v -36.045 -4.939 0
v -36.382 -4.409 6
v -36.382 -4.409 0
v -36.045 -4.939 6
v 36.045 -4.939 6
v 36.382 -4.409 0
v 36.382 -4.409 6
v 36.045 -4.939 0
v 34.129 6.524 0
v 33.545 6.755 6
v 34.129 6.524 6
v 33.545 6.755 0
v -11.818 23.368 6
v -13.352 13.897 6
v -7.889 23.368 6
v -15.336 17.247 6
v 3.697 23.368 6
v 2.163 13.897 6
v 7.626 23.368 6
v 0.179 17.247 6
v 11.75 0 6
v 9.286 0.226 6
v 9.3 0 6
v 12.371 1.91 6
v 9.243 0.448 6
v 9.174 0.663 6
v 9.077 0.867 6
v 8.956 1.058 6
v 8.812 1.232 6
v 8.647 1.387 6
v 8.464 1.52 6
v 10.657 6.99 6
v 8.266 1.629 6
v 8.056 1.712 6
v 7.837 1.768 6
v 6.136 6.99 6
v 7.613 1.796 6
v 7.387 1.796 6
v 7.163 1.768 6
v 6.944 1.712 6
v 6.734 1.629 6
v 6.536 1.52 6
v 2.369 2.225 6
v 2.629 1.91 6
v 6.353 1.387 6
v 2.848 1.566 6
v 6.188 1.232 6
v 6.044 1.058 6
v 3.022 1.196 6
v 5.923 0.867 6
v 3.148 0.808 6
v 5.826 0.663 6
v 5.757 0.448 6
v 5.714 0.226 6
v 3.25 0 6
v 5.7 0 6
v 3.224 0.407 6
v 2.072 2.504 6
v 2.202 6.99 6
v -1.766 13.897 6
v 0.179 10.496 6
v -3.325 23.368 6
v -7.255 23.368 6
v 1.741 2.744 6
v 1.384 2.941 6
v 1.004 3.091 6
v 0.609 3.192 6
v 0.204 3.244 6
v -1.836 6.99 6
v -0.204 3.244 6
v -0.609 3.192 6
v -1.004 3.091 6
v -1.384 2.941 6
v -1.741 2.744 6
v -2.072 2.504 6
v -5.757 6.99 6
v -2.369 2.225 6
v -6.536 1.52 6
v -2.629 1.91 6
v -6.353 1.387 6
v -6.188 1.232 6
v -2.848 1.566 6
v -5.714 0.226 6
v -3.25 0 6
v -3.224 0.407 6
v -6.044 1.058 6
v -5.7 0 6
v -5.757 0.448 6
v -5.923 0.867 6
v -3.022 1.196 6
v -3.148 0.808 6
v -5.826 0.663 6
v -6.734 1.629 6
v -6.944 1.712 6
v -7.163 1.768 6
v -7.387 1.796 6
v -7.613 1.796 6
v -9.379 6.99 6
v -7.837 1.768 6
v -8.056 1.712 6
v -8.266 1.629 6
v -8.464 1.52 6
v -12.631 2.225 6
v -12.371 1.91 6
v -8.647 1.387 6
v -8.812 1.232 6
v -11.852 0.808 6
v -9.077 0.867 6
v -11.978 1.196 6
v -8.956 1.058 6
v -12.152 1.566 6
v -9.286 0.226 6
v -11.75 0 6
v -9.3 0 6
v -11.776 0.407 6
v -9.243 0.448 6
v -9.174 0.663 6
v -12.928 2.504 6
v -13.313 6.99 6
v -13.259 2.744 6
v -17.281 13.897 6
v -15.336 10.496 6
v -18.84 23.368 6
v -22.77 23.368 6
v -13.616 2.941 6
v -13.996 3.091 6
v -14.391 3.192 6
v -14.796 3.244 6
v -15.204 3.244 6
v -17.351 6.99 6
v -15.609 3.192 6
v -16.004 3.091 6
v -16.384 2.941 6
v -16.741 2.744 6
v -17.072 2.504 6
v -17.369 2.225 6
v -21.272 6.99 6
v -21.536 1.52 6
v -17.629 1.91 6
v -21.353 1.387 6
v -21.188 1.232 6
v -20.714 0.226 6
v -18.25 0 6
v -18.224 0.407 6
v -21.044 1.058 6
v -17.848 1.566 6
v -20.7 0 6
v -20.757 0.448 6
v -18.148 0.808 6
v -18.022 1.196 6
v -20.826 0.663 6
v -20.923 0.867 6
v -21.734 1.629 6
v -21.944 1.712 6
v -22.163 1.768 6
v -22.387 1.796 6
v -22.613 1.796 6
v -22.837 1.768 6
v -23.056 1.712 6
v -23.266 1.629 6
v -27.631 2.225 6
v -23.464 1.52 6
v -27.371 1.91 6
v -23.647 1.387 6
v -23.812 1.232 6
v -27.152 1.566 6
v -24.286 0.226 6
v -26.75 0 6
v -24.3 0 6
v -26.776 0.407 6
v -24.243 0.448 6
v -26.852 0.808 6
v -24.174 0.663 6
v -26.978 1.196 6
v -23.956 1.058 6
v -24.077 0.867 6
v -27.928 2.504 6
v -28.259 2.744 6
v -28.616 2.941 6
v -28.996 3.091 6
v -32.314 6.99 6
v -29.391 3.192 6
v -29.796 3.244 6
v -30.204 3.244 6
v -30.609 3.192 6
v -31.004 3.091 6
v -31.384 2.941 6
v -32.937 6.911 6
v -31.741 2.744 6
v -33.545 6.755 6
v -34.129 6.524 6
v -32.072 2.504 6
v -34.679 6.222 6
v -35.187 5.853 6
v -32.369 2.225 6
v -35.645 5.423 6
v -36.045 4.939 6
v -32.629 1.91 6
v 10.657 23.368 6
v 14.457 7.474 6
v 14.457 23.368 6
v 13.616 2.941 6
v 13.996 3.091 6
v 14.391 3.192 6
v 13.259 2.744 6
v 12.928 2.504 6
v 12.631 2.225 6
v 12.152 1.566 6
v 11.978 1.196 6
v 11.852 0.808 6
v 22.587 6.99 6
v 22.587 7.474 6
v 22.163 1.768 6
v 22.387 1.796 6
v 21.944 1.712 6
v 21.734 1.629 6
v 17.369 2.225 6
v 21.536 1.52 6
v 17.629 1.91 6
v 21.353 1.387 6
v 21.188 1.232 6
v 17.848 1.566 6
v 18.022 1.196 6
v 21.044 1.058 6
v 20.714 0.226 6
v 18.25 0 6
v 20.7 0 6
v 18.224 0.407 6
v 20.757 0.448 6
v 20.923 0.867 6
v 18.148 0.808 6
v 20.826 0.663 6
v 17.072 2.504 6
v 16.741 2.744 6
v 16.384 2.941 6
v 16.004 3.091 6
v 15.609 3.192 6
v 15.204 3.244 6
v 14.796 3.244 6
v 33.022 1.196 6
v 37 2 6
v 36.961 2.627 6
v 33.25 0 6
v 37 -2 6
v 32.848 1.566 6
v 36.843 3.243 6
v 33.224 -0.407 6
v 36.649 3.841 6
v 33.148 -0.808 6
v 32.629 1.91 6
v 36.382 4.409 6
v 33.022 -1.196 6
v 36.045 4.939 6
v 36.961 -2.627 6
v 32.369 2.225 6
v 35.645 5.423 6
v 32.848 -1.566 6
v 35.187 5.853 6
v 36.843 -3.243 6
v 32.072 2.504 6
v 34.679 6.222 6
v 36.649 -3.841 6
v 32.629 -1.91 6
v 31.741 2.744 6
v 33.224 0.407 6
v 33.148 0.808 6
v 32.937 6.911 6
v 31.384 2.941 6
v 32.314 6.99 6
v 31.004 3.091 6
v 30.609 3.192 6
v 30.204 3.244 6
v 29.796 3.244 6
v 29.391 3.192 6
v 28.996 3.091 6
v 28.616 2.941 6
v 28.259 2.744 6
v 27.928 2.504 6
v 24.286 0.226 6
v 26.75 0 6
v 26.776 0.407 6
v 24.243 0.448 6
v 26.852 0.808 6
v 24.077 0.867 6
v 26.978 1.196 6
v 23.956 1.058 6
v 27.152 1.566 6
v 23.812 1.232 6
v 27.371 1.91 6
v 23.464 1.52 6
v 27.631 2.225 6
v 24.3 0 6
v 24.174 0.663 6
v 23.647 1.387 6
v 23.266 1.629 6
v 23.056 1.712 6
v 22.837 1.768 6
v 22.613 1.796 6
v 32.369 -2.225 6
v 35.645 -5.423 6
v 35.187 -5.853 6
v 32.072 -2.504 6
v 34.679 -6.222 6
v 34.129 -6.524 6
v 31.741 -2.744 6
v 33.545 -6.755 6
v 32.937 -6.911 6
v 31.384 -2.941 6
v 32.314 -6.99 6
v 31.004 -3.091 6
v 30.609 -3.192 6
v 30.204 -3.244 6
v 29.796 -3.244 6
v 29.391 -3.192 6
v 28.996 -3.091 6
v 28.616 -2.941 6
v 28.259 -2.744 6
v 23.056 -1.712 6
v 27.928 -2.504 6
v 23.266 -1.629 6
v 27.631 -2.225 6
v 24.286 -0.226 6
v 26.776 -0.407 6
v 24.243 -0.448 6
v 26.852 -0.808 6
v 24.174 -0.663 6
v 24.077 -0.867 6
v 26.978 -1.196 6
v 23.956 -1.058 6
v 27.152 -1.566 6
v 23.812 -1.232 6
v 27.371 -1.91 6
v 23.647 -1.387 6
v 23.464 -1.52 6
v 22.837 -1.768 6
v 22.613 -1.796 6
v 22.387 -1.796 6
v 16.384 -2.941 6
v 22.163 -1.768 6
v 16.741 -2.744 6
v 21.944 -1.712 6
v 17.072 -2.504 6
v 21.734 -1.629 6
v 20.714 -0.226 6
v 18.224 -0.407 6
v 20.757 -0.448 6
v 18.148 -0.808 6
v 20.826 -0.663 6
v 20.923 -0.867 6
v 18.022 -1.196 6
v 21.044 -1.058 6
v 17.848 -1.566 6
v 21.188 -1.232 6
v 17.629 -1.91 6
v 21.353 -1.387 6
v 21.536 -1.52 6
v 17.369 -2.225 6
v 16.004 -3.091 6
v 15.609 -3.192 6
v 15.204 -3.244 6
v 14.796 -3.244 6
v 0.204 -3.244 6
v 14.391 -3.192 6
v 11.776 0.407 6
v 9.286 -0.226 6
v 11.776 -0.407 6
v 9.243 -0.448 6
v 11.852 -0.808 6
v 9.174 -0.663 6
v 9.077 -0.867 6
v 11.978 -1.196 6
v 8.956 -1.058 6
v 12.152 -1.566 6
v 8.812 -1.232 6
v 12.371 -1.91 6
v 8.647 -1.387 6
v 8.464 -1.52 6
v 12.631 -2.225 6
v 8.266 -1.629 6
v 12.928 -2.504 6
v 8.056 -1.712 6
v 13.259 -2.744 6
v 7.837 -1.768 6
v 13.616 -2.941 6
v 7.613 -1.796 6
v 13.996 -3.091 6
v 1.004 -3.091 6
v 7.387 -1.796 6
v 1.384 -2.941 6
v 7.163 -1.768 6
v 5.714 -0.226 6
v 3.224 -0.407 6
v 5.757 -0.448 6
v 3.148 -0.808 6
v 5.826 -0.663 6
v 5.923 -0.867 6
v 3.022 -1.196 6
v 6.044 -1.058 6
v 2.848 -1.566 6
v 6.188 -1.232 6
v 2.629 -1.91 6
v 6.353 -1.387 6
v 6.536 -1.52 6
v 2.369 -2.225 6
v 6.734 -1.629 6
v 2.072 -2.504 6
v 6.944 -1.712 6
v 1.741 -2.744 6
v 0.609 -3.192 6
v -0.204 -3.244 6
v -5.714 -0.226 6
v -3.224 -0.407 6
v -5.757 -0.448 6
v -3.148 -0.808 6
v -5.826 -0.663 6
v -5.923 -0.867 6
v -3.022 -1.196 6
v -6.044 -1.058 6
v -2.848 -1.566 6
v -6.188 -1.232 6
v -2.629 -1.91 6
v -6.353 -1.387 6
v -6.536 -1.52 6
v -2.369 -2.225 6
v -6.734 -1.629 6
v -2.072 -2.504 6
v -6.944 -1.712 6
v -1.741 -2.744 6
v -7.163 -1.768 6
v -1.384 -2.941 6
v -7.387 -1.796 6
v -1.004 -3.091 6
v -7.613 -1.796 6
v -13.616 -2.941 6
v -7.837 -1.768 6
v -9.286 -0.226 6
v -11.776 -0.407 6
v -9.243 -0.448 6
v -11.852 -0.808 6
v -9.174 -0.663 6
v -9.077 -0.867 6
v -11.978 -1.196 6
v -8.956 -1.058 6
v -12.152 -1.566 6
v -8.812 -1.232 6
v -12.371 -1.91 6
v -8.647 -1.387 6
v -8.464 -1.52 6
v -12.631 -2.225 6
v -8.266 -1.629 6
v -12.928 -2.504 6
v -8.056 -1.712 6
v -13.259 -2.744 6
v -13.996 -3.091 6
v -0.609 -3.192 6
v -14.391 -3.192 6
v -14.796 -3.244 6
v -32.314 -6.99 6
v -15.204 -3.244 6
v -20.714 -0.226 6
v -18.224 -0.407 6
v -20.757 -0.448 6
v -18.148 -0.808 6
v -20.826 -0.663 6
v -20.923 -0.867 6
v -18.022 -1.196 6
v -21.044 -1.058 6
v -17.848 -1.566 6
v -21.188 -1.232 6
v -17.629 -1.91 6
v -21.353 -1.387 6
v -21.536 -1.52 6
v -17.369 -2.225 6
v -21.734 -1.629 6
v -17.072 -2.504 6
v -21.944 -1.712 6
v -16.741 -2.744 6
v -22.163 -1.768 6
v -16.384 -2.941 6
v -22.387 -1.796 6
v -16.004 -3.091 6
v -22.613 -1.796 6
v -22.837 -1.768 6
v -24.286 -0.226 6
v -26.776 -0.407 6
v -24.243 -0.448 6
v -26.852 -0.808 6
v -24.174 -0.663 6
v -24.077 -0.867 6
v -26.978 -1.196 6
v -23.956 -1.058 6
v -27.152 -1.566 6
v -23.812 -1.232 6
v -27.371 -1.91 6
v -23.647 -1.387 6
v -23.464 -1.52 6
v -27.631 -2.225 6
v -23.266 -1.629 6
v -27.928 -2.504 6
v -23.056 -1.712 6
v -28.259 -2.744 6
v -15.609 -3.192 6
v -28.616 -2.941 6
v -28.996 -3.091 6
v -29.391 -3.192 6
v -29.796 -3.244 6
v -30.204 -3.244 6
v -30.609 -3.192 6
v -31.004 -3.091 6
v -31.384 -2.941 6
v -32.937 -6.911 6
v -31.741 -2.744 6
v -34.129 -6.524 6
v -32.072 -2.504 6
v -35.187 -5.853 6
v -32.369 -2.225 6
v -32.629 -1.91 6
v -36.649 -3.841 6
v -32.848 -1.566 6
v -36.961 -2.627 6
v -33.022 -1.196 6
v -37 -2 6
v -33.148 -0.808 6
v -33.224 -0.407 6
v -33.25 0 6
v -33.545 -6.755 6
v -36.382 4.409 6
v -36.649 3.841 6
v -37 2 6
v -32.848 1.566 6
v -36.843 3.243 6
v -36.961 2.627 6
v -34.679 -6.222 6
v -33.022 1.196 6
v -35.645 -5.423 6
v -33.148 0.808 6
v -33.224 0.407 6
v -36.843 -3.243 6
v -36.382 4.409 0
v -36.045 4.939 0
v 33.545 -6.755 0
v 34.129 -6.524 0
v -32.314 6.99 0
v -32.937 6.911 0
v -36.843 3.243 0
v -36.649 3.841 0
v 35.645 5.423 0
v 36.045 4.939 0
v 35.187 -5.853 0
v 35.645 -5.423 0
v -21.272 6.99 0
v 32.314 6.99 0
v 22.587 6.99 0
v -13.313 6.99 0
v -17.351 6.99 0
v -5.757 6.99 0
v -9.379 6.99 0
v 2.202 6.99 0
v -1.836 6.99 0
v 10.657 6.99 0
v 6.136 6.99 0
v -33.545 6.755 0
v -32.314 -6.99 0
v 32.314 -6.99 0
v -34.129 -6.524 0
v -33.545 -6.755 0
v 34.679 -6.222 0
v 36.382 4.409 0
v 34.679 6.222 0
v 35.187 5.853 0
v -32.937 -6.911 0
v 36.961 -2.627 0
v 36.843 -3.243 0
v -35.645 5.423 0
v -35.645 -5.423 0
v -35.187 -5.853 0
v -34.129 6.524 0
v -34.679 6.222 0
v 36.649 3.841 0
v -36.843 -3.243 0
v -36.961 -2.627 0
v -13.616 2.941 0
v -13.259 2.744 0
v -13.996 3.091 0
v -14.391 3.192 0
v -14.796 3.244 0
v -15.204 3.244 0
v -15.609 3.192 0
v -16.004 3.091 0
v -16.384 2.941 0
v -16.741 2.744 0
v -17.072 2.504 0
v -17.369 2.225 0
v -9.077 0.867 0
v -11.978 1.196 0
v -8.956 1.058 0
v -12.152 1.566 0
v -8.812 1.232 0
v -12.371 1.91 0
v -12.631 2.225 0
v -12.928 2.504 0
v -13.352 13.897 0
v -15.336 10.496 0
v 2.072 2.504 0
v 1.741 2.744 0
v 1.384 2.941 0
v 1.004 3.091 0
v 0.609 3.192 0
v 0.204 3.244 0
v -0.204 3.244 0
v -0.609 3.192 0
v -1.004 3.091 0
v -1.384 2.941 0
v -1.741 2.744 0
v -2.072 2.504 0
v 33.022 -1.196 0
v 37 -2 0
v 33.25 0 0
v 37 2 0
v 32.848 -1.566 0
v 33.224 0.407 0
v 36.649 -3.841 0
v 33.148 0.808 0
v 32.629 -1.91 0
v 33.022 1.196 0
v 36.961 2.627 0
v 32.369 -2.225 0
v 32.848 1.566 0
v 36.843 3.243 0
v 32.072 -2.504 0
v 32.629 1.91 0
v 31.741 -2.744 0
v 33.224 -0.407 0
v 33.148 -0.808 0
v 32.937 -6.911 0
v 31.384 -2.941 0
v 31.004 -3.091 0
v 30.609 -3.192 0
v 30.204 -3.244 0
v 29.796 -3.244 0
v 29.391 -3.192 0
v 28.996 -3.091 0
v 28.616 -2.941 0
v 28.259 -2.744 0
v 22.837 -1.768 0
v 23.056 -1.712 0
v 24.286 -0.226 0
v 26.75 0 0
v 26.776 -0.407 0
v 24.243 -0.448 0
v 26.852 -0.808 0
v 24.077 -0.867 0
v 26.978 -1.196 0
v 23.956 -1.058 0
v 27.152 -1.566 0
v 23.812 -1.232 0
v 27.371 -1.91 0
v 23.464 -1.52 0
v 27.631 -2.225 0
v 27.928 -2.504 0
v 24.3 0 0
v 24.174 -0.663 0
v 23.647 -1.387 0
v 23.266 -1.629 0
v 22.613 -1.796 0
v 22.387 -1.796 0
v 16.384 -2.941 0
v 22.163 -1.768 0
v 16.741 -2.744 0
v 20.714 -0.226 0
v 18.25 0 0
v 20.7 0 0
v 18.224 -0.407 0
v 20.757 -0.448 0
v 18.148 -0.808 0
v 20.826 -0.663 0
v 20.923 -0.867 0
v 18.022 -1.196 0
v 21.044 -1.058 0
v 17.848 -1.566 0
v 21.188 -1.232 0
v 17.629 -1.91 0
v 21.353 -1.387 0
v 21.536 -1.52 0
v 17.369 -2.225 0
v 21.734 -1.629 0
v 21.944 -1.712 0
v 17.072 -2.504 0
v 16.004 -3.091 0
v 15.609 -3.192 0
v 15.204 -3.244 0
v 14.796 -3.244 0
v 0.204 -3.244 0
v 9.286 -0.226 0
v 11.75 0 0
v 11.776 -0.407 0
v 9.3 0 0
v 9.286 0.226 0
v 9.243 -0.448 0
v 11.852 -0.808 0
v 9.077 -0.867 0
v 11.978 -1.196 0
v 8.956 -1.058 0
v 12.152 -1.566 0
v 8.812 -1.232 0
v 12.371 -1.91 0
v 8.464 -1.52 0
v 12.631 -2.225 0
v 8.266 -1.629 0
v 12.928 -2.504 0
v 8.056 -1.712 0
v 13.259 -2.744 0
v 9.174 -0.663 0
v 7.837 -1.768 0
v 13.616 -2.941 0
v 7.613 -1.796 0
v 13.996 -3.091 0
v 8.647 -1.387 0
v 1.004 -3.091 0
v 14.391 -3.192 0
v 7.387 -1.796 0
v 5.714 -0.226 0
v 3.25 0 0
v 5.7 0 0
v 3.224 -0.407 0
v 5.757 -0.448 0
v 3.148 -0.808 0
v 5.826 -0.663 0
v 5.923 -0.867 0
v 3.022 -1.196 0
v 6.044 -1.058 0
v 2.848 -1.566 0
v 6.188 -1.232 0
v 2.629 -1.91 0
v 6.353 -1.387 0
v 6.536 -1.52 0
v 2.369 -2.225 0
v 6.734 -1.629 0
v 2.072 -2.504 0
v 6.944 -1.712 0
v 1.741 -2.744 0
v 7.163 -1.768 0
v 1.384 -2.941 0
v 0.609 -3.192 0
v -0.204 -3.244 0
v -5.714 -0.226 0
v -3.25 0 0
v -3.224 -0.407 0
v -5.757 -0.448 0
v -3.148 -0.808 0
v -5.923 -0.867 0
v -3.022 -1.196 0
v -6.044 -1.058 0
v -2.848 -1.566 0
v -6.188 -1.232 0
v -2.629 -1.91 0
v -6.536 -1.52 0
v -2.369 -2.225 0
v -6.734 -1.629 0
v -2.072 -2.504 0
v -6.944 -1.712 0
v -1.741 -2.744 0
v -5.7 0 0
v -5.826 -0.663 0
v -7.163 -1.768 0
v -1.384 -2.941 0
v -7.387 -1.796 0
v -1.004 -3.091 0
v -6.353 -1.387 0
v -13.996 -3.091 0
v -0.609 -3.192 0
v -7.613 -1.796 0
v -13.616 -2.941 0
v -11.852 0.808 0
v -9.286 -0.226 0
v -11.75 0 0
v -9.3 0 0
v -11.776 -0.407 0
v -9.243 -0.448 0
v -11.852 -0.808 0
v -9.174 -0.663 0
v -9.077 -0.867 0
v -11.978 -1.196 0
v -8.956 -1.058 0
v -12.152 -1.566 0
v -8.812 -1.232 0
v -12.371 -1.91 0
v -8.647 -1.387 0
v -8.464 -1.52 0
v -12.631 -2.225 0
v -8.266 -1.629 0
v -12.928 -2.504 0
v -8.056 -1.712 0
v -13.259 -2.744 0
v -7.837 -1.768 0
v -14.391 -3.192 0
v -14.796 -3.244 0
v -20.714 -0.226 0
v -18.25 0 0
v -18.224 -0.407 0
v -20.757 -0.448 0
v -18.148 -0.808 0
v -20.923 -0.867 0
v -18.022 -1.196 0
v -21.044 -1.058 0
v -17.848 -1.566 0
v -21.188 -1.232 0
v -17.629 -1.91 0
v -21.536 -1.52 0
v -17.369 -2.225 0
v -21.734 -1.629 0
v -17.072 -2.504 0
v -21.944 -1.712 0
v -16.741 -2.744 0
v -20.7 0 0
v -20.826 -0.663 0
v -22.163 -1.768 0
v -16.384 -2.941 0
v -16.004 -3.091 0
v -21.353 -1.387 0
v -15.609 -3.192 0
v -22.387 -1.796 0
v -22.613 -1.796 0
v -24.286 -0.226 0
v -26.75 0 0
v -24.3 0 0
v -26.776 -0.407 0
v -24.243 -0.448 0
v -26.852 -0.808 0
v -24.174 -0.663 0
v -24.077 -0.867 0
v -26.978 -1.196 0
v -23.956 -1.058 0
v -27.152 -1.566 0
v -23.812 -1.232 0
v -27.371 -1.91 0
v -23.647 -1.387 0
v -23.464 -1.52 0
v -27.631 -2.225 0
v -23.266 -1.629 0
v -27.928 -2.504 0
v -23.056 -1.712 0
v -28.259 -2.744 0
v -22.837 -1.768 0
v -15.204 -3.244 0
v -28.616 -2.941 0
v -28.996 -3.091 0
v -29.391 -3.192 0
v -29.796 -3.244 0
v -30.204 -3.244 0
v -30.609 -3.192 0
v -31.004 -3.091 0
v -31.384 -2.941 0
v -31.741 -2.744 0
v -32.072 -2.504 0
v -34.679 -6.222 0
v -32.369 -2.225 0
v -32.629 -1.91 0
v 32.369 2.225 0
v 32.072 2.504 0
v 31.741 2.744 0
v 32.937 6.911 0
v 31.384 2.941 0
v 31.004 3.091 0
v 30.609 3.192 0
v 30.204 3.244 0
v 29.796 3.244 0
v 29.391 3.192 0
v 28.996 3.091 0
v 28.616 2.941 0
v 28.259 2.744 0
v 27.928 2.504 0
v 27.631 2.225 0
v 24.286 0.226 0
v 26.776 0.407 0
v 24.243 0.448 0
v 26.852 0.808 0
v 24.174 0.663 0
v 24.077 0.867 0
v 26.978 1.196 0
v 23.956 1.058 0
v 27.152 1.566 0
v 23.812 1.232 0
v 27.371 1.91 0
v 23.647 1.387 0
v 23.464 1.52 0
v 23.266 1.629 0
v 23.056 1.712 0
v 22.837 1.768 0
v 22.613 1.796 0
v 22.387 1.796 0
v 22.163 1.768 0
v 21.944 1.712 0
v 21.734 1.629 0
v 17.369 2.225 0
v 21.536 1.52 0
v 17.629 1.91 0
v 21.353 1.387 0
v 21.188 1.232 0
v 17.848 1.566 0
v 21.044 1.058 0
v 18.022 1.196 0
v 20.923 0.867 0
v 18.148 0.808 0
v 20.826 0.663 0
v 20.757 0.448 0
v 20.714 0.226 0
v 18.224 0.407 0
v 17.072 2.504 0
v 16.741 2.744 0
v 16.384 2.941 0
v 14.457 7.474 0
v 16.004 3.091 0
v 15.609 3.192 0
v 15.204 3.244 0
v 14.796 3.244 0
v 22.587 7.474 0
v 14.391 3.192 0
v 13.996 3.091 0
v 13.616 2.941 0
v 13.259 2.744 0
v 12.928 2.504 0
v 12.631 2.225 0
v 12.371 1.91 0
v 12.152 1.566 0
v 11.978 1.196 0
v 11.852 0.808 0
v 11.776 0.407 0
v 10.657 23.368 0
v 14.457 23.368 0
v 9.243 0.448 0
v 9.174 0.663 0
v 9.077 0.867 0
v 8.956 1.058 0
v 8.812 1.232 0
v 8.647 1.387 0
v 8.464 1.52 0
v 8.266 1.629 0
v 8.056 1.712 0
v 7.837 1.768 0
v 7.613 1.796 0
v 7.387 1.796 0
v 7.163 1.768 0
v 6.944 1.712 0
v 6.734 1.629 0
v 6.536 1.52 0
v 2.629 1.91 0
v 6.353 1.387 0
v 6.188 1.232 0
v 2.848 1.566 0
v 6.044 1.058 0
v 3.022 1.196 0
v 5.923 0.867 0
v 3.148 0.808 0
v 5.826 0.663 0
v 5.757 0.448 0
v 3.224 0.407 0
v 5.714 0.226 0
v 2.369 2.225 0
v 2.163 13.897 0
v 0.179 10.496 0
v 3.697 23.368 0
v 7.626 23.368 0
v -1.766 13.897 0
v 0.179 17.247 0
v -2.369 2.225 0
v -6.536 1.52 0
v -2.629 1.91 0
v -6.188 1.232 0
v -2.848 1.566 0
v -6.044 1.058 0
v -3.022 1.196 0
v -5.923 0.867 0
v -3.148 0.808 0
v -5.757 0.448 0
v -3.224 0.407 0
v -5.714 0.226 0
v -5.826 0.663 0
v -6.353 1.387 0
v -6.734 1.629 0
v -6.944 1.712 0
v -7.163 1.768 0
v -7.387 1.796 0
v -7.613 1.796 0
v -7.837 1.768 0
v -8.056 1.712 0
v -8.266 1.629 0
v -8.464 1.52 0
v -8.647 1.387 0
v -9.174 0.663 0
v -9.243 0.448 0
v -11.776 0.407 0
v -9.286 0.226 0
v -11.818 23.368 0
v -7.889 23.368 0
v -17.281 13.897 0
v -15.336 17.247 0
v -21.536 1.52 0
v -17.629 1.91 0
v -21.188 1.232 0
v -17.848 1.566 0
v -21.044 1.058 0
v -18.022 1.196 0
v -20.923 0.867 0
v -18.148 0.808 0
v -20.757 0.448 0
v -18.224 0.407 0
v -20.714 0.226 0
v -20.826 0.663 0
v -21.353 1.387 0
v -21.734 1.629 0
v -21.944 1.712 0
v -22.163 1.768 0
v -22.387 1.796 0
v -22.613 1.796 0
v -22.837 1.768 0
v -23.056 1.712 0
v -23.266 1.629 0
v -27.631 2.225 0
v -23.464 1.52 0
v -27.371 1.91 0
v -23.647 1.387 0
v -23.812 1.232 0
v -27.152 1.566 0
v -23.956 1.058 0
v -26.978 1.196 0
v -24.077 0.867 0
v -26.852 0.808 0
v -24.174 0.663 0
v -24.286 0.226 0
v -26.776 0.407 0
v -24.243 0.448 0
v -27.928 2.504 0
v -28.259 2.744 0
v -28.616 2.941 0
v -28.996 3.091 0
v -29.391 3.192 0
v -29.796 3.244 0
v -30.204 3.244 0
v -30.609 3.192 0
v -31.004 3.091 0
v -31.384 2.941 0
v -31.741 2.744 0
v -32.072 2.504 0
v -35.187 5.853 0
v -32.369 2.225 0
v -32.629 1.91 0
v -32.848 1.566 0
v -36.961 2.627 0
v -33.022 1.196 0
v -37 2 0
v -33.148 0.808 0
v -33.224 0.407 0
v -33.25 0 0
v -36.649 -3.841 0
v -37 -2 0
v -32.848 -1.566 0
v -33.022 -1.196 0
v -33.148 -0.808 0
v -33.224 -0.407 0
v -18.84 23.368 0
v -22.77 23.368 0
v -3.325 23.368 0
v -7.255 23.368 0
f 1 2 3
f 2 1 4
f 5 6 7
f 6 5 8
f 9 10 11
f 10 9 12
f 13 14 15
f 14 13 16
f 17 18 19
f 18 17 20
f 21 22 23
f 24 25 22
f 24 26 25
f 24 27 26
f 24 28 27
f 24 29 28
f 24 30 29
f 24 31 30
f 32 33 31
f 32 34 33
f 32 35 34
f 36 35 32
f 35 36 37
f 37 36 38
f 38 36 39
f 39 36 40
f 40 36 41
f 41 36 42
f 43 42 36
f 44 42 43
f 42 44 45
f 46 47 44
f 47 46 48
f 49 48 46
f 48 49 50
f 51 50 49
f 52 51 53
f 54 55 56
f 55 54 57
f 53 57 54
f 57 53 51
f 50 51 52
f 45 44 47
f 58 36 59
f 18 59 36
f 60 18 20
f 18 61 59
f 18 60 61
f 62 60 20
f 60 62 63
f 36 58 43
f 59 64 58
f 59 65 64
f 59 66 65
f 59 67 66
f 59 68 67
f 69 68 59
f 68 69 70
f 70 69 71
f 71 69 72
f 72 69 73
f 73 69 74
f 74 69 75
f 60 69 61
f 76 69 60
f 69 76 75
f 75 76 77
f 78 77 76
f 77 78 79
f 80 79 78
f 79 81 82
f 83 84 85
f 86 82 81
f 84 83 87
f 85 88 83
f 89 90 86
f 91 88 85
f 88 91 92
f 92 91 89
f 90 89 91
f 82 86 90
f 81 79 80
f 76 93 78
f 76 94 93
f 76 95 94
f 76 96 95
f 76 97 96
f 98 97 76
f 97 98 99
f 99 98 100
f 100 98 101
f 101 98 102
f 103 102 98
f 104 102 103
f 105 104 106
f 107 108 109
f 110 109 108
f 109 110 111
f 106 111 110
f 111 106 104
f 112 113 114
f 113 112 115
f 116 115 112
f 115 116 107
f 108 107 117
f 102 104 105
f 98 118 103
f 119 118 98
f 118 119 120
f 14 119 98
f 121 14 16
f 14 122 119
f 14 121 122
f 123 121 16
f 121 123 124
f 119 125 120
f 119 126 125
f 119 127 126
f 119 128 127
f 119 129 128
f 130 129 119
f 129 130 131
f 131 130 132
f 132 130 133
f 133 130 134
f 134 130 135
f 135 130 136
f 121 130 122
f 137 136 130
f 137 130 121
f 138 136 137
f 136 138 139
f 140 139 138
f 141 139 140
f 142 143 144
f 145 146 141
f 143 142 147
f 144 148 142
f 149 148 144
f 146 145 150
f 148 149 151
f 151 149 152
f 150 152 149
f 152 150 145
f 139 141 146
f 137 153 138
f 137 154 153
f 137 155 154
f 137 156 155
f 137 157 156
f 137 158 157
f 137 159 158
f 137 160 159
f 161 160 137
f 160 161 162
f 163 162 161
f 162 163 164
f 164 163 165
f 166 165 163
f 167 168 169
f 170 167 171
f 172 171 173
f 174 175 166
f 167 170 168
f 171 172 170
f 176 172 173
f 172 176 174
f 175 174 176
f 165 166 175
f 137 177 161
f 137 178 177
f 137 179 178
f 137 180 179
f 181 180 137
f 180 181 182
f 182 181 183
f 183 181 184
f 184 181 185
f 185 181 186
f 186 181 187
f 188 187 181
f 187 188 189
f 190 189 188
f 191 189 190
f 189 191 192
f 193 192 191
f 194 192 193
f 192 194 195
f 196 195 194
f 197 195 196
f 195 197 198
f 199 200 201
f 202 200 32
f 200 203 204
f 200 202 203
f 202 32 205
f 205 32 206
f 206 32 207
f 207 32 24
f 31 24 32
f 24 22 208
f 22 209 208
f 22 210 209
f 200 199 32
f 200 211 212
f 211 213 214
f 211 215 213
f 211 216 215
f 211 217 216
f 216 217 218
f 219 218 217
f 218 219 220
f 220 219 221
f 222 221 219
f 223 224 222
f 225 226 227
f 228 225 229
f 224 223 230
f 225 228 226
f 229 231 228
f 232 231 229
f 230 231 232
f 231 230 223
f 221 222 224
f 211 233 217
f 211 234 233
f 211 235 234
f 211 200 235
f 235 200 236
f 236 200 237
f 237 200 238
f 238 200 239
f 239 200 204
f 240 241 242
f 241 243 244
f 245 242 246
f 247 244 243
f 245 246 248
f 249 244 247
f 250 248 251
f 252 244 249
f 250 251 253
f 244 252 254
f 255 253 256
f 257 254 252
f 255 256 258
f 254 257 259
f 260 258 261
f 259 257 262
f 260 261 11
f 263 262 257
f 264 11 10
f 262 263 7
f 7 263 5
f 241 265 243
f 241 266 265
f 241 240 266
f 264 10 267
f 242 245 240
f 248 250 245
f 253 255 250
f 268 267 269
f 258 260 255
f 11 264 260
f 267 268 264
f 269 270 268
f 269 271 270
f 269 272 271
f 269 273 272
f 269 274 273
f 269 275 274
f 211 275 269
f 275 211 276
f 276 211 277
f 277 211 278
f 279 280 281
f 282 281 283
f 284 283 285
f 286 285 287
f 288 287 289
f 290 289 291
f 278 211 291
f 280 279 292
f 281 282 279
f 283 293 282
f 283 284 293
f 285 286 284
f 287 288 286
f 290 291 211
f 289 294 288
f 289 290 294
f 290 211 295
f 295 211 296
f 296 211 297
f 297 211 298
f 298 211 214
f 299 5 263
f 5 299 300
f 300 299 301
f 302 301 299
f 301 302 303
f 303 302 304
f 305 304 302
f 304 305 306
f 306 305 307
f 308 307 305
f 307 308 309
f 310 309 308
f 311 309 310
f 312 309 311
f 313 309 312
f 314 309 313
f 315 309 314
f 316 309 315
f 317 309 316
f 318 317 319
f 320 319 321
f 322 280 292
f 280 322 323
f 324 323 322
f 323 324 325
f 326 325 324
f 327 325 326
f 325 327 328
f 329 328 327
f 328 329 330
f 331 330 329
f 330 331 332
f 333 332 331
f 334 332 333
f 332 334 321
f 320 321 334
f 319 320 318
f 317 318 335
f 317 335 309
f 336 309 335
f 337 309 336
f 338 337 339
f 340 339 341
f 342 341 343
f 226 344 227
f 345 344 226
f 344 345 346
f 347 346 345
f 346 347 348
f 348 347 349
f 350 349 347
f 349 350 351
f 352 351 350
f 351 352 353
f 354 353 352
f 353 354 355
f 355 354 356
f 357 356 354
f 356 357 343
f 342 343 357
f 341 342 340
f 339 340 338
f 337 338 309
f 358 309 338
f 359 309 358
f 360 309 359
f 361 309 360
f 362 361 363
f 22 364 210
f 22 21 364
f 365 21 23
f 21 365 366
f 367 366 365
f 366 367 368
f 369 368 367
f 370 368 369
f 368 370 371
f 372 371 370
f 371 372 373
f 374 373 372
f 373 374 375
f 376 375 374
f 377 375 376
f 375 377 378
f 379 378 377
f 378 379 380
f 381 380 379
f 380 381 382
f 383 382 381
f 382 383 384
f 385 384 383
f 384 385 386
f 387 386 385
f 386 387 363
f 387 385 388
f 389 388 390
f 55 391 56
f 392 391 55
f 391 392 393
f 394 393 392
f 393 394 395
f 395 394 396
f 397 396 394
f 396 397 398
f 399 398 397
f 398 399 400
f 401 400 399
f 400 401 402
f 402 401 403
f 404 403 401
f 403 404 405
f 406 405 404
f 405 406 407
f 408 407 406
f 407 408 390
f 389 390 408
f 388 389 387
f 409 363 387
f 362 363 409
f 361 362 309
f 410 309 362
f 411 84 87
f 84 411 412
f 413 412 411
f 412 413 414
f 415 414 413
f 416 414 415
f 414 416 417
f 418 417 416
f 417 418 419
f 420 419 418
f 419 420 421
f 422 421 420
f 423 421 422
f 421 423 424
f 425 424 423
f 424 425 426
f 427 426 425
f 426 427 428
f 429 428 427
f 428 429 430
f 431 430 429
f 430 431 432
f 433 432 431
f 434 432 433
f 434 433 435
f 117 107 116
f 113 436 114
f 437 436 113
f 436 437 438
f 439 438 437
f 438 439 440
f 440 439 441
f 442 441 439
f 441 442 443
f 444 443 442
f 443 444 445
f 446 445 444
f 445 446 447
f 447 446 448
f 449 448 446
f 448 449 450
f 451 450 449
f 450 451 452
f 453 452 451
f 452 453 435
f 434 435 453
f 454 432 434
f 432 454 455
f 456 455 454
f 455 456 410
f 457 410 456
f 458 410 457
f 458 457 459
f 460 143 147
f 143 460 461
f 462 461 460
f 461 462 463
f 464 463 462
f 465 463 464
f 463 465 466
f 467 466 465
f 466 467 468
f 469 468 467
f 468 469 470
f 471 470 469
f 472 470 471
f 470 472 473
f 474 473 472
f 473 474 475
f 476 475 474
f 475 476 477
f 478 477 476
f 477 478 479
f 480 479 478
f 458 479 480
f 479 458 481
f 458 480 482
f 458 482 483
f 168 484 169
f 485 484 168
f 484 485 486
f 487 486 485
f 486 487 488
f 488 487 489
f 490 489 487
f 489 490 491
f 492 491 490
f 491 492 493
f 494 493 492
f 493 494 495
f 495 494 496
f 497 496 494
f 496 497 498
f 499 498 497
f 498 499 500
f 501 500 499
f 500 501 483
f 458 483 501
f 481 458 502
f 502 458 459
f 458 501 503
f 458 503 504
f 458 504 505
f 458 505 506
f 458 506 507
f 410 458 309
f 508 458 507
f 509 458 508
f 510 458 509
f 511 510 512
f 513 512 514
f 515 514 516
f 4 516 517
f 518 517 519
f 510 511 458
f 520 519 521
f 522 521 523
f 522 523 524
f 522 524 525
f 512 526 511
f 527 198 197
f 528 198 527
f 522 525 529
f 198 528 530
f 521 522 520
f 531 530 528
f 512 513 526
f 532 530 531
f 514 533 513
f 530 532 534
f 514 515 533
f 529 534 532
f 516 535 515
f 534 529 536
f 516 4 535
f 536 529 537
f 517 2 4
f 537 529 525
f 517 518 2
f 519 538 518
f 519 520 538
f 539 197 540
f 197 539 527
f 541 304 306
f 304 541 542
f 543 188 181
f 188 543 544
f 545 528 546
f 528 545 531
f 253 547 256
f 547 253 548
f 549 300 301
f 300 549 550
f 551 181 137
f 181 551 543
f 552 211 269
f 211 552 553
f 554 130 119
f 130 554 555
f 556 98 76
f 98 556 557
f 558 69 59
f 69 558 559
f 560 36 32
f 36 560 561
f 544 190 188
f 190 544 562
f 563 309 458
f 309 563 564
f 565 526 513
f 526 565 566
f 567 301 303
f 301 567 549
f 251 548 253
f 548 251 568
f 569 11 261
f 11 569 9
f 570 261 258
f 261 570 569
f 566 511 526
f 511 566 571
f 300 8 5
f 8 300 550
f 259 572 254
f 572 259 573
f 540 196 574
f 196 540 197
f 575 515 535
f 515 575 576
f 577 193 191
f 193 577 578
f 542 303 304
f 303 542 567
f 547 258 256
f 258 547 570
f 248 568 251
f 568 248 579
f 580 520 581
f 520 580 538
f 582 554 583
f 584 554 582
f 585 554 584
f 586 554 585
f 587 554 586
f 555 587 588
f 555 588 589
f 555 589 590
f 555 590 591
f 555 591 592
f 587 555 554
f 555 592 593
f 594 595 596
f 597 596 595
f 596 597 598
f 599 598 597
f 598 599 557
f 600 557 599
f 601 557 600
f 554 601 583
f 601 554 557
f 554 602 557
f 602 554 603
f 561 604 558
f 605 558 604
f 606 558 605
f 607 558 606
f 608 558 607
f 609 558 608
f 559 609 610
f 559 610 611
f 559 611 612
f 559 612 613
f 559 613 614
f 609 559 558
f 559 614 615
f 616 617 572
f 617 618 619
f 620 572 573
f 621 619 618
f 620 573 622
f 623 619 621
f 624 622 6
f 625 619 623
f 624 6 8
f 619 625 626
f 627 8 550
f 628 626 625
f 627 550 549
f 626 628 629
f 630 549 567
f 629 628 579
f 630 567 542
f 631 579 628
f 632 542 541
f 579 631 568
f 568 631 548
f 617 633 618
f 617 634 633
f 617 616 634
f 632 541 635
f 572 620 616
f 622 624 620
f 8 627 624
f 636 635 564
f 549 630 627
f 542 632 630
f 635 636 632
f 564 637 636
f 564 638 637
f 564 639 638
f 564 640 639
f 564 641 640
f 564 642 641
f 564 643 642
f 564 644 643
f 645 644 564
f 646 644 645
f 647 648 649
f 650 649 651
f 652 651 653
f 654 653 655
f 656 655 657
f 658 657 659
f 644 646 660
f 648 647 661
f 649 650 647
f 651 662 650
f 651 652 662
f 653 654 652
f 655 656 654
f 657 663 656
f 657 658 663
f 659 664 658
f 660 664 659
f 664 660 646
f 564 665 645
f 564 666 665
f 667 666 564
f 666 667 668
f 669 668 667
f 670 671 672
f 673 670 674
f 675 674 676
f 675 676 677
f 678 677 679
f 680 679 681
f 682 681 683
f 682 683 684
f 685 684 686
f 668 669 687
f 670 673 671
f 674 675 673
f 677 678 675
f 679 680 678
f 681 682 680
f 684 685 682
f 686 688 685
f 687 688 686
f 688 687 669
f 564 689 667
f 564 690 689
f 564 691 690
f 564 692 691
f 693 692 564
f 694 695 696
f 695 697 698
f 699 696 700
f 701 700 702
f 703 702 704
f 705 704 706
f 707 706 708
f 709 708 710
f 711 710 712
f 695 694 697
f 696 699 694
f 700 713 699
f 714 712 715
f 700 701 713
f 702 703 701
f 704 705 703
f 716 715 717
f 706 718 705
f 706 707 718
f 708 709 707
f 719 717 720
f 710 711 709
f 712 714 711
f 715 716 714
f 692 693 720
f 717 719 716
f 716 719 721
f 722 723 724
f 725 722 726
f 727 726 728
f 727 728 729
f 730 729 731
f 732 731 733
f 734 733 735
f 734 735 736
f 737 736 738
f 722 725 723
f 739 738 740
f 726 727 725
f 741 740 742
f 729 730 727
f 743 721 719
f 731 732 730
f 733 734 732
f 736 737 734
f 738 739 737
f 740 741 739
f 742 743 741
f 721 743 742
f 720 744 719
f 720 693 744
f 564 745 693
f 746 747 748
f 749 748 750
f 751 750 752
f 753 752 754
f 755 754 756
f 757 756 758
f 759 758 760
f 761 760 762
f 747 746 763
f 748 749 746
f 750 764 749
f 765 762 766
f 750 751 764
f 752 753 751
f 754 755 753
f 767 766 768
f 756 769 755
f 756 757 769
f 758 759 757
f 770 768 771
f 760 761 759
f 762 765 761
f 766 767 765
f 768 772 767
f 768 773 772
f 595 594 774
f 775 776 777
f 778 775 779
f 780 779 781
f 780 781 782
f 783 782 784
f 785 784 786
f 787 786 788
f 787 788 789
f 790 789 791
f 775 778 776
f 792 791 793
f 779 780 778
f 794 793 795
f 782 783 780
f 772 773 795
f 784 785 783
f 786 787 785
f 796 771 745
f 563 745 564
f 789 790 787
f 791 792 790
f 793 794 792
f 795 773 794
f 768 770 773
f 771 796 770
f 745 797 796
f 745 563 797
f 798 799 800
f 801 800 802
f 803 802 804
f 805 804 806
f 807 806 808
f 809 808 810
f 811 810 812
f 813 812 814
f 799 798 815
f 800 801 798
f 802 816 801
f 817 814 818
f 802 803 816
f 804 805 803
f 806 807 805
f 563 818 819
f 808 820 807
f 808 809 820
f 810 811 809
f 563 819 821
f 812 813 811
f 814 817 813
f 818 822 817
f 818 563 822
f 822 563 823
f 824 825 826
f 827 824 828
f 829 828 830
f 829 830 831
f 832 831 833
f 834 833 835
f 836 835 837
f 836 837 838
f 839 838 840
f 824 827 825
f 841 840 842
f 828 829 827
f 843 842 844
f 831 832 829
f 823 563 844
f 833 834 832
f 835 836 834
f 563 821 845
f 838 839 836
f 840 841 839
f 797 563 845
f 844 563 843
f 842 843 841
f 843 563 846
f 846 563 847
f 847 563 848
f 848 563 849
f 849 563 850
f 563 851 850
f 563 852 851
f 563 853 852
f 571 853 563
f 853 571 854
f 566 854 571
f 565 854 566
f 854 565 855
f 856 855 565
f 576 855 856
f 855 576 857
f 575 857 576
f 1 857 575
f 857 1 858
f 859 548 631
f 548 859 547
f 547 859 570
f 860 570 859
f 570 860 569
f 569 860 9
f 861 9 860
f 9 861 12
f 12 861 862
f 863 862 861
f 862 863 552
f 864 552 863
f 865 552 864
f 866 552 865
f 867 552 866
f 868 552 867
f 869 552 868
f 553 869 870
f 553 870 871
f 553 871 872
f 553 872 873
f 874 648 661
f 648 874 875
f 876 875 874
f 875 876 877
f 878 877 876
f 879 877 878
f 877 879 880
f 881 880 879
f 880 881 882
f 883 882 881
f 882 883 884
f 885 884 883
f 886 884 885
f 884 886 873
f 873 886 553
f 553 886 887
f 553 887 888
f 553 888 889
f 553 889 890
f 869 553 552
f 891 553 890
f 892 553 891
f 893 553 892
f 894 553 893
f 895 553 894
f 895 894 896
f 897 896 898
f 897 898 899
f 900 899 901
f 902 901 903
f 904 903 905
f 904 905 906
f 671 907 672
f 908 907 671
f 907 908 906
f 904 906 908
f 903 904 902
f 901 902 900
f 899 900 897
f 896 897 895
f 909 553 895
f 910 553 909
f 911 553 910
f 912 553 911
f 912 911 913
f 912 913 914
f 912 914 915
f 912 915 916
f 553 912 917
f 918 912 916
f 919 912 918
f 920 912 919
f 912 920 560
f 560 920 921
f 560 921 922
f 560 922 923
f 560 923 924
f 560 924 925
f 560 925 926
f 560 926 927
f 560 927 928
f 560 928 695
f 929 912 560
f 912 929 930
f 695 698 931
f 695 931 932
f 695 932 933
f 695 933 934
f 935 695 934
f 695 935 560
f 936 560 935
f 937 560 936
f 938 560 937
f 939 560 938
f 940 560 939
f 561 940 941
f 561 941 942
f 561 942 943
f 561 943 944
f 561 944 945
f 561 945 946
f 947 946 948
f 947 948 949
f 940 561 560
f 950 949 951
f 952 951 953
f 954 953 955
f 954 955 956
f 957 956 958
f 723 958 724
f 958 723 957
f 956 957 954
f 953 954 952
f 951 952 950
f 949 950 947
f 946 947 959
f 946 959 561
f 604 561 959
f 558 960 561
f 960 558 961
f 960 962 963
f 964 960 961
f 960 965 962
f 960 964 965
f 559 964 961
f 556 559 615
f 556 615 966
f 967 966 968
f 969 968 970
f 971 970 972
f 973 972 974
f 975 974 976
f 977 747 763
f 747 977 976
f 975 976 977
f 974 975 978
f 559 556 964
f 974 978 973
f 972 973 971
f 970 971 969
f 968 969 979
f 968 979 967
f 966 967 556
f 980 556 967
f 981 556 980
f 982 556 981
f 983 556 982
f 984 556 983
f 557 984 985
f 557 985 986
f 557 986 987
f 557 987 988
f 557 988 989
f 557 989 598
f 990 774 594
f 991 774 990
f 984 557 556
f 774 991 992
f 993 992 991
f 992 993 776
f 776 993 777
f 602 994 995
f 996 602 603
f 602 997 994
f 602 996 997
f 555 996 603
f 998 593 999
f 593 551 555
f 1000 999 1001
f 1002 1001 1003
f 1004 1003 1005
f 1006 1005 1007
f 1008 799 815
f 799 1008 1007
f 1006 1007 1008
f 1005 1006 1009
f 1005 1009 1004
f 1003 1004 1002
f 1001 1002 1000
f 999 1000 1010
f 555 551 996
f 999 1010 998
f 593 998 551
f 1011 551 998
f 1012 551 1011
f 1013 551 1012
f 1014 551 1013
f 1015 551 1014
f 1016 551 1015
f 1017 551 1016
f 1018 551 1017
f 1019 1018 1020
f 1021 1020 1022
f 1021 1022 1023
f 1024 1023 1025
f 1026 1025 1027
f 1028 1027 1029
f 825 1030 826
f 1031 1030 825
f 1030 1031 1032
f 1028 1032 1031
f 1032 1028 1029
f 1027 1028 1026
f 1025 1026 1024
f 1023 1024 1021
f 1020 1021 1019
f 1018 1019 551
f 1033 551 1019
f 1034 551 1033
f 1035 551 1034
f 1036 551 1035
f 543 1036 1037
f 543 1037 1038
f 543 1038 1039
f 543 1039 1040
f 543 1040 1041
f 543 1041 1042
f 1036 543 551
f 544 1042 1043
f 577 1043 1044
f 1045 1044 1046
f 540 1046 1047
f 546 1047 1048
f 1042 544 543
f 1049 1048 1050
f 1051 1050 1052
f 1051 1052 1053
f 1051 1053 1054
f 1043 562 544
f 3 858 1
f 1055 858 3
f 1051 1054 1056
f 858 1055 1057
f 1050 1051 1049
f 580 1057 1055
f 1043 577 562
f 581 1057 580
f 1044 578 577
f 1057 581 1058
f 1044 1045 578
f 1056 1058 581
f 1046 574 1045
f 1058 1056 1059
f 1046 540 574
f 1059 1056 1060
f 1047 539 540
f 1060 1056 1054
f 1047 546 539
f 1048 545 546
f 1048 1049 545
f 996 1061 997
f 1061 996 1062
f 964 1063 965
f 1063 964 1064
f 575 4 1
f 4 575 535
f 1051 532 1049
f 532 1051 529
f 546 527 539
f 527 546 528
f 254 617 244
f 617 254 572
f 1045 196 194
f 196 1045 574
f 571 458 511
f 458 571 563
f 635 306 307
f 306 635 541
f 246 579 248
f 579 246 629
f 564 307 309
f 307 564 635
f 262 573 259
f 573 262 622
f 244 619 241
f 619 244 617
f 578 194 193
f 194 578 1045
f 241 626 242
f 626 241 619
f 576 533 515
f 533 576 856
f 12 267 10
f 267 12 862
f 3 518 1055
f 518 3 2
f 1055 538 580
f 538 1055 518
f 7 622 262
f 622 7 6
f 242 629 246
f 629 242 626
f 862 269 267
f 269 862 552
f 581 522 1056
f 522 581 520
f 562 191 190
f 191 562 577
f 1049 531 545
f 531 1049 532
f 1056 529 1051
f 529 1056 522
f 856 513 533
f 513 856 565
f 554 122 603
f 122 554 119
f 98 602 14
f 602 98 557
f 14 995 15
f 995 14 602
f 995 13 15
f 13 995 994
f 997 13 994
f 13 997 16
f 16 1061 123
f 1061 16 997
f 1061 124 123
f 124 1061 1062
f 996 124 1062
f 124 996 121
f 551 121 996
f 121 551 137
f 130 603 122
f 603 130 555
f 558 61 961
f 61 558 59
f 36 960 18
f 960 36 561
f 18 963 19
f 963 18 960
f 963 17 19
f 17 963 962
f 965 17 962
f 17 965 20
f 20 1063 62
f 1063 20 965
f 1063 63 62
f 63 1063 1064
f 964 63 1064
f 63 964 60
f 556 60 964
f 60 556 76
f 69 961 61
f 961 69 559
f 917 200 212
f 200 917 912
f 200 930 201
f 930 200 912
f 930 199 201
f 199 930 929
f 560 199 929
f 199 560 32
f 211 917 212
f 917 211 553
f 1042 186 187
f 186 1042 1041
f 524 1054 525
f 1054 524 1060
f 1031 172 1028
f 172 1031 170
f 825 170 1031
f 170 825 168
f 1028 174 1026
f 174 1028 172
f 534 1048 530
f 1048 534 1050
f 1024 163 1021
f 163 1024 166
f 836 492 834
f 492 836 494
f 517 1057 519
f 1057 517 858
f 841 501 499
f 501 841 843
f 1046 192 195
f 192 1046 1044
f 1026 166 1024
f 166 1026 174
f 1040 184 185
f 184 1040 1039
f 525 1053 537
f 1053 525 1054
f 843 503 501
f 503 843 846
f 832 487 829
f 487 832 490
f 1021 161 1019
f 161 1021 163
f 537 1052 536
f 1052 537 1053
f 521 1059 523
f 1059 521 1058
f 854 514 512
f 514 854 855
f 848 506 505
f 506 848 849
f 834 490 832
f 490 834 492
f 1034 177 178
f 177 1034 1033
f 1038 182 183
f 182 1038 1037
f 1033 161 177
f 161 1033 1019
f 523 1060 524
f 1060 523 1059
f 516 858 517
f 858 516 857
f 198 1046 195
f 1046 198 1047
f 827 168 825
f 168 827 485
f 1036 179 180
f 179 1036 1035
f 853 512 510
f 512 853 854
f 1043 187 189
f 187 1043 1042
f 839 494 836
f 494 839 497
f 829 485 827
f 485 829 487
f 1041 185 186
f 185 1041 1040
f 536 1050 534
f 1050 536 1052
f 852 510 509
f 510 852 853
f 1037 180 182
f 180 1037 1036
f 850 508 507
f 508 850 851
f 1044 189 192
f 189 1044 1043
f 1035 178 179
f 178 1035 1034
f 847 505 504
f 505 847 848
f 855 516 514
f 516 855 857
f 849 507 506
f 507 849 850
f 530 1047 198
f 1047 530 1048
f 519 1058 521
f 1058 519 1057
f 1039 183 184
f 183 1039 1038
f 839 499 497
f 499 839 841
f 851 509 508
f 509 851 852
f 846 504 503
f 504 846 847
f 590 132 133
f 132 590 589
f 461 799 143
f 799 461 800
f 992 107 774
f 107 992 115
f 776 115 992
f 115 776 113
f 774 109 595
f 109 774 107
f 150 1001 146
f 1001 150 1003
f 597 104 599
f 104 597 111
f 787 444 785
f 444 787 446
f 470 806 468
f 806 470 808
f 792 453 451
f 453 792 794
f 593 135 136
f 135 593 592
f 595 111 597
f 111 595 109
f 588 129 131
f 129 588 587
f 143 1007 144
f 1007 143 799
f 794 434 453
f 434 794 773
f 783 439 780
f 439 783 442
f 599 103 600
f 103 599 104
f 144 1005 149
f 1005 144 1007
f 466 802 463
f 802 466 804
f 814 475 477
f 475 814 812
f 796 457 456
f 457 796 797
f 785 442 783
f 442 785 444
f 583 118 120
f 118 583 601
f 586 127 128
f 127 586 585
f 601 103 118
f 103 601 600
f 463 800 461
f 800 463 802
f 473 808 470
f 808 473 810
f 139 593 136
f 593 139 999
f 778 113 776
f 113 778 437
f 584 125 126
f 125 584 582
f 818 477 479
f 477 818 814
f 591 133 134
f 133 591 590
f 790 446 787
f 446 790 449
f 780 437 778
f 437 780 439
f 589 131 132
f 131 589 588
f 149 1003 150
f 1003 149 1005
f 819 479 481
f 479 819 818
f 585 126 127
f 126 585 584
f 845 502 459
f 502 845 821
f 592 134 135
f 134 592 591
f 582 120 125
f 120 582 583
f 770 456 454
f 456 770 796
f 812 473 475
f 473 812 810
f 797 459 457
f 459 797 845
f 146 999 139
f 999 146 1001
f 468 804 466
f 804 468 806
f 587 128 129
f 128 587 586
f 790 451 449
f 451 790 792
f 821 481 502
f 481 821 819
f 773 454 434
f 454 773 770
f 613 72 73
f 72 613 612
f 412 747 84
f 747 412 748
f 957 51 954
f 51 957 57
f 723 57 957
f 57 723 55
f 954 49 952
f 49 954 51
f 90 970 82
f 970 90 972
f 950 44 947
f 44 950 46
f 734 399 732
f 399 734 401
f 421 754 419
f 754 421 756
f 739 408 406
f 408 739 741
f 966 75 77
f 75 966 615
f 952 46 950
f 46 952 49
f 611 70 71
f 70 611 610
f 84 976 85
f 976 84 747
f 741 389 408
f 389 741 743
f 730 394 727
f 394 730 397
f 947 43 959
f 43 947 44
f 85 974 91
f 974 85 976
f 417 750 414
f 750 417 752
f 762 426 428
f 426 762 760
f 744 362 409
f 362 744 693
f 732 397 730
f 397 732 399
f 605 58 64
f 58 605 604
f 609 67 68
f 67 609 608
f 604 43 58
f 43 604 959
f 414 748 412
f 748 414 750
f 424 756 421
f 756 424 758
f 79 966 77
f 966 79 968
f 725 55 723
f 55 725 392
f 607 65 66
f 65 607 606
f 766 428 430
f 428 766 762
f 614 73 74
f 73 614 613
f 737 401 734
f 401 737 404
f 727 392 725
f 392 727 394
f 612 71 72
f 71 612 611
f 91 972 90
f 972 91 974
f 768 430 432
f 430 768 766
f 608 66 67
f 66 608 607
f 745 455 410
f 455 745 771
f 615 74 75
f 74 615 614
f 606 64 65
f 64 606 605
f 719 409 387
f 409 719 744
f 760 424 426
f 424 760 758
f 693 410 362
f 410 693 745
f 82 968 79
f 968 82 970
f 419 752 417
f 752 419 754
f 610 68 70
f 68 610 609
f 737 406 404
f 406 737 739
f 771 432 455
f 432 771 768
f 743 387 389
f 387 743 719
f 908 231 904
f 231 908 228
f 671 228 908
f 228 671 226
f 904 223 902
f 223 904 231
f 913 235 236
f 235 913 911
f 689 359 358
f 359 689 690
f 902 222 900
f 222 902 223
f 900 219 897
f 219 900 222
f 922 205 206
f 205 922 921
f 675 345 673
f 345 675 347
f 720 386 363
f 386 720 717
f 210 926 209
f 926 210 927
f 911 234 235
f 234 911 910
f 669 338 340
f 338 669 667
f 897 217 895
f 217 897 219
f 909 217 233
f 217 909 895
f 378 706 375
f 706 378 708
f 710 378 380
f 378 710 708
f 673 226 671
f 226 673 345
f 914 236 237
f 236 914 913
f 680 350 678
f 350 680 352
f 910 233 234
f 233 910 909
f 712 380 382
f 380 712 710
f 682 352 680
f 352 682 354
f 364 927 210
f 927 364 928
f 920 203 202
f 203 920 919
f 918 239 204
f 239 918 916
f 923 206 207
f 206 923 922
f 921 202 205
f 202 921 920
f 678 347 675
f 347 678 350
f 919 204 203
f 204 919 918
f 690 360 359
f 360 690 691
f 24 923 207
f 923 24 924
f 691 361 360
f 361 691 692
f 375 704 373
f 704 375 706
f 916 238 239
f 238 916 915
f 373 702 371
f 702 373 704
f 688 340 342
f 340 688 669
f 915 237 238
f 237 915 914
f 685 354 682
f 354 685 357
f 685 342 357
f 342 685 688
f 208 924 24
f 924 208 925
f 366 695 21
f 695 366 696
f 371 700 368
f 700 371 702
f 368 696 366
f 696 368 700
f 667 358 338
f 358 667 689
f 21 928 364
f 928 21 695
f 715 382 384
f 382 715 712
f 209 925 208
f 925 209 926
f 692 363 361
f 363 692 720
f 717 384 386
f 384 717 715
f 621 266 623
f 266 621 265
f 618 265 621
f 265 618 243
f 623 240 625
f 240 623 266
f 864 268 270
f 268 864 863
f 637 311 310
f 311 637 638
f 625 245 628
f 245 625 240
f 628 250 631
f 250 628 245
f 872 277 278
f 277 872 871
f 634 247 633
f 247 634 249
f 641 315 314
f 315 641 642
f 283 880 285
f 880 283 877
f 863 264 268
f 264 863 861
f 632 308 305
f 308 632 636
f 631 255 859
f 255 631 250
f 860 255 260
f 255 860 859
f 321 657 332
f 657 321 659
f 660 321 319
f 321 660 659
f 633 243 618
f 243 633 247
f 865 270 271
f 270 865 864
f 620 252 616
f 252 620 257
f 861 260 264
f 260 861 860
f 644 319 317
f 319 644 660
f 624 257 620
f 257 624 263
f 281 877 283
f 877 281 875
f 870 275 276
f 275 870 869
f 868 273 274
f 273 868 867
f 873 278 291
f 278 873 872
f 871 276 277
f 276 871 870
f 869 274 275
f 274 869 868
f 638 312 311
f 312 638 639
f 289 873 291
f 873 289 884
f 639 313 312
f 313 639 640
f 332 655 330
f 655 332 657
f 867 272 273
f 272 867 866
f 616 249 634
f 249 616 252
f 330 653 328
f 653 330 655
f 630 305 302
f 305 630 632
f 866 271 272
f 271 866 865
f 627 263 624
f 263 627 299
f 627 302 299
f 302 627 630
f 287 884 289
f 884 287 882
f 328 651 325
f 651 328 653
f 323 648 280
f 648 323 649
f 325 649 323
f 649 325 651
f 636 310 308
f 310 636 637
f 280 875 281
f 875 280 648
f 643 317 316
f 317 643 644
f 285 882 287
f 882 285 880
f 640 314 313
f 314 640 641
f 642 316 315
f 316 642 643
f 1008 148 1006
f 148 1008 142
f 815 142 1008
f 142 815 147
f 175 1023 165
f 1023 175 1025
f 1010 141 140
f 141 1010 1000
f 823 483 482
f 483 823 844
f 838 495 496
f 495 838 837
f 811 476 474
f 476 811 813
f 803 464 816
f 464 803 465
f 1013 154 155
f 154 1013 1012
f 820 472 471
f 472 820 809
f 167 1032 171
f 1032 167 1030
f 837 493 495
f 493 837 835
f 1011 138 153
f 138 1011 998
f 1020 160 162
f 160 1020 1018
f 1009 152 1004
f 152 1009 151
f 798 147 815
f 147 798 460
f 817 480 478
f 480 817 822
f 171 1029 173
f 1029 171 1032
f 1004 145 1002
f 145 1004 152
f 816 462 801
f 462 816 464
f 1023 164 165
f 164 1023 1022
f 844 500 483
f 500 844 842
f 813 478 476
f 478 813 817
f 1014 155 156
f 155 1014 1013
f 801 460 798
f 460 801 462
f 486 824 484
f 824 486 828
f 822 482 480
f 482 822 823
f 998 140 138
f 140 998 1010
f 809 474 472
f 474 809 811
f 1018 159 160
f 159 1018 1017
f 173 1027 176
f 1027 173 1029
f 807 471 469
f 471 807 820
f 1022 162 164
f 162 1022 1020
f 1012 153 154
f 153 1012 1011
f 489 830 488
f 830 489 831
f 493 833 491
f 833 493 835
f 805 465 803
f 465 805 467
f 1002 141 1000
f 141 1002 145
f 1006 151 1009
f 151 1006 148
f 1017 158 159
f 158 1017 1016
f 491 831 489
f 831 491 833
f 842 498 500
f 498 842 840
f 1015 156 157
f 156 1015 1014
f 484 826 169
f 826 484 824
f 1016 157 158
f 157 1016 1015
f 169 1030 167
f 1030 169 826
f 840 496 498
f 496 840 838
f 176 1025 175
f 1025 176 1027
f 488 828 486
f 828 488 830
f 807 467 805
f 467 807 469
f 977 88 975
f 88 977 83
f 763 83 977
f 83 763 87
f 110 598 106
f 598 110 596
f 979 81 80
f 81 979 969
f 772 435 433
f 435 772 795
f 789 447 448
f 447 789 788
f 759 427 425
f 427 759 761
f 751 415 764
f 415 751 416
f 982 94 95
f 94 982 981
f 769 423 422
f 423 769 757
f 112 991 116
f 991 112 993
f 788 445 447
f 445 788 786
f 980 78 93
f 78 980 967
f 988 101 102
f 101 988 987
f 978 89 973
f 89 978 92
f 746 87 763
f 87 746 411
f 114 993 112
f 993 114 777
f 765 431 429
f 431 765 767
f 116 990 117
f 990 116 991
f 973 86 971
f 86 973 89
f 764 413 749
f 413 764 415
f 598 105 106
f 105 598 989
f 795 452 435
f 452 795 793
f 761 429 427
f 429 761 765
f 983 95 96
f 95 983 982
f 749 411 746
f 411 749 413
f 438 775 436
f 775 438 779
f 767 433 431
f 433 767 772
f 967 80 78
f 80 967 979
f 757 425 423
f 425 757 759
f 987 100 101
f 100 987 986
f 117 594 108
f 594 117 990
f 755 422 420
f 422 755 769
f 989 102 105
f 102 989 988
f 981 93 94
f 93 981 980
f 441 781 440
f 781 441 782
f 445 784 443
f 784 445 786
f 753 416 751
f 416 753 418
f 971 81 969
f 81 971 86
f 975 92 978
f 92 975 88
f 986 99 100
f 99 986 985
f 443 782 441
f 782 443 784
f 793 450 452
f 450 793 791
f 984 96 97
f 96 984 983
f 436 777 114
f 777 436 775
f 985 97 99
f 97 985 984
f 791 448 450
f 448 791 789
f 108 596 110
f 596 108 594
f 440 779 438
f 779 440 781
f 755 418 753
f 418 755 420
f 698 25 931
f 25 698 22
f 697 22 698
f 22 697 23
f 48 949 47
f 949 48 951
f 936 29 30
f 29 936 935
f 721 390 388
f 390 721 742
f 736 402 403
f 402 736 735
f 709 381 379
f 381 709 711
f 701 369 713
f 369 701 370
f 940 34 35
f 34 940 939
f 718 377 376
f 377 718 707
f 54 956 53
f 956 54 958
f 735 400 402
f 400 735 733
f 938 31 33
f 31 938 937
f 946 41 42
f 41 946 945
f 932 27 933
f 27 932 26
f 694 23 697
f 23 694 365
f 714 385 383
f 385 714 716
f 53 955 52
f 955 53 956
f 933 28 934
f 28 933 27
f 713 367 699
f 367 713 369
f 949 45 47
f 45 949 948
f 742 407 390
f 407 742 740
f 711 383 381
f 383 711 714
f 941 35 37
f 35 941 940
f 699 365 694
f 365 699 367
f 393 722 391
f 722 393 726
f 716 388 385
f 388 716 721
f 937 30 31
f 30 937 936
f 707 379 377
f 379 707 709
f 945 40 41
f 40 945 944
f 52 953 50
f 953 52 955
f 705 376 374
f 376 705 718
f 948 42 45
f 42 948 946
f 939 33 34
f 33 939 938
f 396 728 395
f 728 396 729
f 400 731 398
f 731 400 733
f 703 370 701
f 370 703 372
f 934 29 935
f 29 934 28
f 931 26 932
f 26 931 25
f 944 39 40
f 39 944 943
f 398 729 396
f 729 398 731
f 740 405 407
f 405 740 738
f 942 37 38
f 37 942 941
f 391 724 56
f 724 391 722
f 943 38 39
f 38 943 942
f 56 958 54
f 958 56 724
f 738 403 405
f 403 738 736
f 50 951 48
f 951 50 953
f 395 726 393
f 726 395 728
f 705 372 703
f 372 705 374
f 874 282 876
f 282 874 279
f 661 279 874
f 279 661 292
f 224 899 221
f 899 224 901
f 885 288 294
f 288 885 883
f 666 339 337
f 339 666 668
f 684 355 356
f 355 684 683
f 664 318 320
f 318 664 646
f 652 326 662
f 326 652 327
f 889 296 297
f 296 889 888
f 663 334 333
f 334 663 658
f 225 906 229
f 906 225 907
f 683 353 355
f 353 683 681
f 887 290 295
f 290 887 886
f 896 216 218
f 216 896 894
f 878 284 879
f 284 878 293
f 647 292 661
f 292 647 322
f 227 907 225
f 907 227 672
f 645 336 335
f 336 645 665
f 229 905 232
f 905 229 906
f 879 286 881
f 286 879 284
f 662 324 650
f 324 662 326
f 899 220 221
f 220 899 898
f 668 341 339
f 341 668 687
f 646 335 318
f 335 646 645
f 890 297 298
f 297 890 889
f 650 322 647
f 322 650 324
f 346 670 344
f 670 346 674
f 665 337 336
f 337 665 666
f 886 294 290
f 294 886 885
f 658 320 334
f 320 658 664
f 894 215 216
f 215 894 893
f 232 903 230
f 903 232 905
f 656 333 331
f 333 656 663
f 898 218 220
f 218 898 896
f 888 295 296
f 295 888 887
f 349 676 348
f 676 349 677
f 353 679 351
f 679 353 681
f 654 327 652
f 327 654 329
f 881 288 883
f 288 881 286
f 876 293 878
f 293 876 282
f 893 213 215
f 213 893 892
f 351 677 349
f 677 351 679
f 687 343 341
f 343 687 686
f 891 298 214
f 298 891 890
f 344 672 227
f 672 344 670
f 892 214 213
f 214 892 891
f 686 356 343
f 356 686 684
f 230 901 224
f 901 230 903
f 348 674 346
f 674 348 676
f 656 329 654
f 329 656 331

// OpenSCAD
$fn = 50;


difference() {
	union() {
		hull() {
			translate(v = [-32.0000000000, 2.0000000000, 0]) {
				cylinder(h = 6, r = 5);
			}
			translate(v = [32.0000000000, 2.0000000000, 0]) {
				cylinder(h = 6, r = 5);
			}
			translate(v = [-32.0000000000, -2.0000000000, 0]) {
				cylinder(h = 6, r = 5);
			}
			translate(v = [32.0000000000, -2.0000000000, 0]) {
				cylinder(h = 6, r = 5);
			}
		}
		translate(v = [0, 22.9166666667, 0]) {
			linear_extrude(height = 6) {
				text(font = "DejaVu Sans Mono:style=Bold", halign = "center", size = 19.0000000000, text = "XXL", valign = "top");
			}
		}
	}
	union() {
		translate(v = [-30.0000000000, 0.0000000000, 0]) {
			translate(v = [0, 0, -100]) {
				cylinder(h = 200, r = 3.2500000000);
			}
		}
		translate(v = [-15.0000000000, 0.0000000000, 0]) {
			translate(v = [0, 0, -100]) {
				cylinder(h = 200, r = 3.2500000000);
			}
		}
		translate(v = [0, 0, -100]) {
			cylinder(h = 200, r = 3.2500000000);
		}
		translate(v = [15.0000000000, 0.0000000000, 0]) {
			translate(v = [0, 0, -100]) {
				cylinder(h = 200, r = 3.2500000000);
			}
		}
		translate(v = [30.0000000000, 0.0000000000, 0]) {
			translate(v = [0, 0, -100]) {
				cylinder(h = 200, r = 3.2500000000);
			}
		}
		translate(v = [-30.0000000000, 0.0000000000, 0]) {
			translate(v = [0, 0, -100]) {
				cylinder(h = 200, r = 1.8000000000);
			}
		}
		translate(v = [-22.5000000000, 0.0000000000, 0]) {
			translate(v = [0, 0, -100]) {
				cylinder(h = 200, r = 1.8000000000);
			}
		}
		translate(v = [-15.0000000000, 0.0000000000, 0]) {
			translate(v = [0, 0, -100]) {
				cylinder(h = 200, r = 1.8000000000);
			}
		}
		translate(v = [-7.5000000000, 0.0000000000, 0]) {
			translate(v = [0, 0, -100]) {
				cylinder(h = 200, r = 1.8000000000);
			}
		}
		translate(v = [0, 0, -100]) {
			cylinder(h = 200, r = 1.8000000000);
		}
		translate(v = [7.5000000000, 0.0000000000, 0]) {
			translate(v = [0, 0, -100]) {
				cylinder(h = 200, r = 1.8000000000);
			}
		}
		translate(v = [15.0000000000, 0.0000000000, 0]) {
			translate(v = [0, 0, -100]) {
				cylinder(h = 200, r = 1.8000000000);
			}
		}
		translate(v = [22.5000000000, 0.0000000000, 0]) {
			translate(v = [0, 0, -100]) {
				cylinder(h = 200, r = 1.8000000000);
			}
		}
		translate(v = [30.0000000000, 0.0000000000, 0]) {
			translate(v = [0, 0, -100]) {
				cylinder(h = 200, r = 1.8000000000);
			}
		}
	}
}
